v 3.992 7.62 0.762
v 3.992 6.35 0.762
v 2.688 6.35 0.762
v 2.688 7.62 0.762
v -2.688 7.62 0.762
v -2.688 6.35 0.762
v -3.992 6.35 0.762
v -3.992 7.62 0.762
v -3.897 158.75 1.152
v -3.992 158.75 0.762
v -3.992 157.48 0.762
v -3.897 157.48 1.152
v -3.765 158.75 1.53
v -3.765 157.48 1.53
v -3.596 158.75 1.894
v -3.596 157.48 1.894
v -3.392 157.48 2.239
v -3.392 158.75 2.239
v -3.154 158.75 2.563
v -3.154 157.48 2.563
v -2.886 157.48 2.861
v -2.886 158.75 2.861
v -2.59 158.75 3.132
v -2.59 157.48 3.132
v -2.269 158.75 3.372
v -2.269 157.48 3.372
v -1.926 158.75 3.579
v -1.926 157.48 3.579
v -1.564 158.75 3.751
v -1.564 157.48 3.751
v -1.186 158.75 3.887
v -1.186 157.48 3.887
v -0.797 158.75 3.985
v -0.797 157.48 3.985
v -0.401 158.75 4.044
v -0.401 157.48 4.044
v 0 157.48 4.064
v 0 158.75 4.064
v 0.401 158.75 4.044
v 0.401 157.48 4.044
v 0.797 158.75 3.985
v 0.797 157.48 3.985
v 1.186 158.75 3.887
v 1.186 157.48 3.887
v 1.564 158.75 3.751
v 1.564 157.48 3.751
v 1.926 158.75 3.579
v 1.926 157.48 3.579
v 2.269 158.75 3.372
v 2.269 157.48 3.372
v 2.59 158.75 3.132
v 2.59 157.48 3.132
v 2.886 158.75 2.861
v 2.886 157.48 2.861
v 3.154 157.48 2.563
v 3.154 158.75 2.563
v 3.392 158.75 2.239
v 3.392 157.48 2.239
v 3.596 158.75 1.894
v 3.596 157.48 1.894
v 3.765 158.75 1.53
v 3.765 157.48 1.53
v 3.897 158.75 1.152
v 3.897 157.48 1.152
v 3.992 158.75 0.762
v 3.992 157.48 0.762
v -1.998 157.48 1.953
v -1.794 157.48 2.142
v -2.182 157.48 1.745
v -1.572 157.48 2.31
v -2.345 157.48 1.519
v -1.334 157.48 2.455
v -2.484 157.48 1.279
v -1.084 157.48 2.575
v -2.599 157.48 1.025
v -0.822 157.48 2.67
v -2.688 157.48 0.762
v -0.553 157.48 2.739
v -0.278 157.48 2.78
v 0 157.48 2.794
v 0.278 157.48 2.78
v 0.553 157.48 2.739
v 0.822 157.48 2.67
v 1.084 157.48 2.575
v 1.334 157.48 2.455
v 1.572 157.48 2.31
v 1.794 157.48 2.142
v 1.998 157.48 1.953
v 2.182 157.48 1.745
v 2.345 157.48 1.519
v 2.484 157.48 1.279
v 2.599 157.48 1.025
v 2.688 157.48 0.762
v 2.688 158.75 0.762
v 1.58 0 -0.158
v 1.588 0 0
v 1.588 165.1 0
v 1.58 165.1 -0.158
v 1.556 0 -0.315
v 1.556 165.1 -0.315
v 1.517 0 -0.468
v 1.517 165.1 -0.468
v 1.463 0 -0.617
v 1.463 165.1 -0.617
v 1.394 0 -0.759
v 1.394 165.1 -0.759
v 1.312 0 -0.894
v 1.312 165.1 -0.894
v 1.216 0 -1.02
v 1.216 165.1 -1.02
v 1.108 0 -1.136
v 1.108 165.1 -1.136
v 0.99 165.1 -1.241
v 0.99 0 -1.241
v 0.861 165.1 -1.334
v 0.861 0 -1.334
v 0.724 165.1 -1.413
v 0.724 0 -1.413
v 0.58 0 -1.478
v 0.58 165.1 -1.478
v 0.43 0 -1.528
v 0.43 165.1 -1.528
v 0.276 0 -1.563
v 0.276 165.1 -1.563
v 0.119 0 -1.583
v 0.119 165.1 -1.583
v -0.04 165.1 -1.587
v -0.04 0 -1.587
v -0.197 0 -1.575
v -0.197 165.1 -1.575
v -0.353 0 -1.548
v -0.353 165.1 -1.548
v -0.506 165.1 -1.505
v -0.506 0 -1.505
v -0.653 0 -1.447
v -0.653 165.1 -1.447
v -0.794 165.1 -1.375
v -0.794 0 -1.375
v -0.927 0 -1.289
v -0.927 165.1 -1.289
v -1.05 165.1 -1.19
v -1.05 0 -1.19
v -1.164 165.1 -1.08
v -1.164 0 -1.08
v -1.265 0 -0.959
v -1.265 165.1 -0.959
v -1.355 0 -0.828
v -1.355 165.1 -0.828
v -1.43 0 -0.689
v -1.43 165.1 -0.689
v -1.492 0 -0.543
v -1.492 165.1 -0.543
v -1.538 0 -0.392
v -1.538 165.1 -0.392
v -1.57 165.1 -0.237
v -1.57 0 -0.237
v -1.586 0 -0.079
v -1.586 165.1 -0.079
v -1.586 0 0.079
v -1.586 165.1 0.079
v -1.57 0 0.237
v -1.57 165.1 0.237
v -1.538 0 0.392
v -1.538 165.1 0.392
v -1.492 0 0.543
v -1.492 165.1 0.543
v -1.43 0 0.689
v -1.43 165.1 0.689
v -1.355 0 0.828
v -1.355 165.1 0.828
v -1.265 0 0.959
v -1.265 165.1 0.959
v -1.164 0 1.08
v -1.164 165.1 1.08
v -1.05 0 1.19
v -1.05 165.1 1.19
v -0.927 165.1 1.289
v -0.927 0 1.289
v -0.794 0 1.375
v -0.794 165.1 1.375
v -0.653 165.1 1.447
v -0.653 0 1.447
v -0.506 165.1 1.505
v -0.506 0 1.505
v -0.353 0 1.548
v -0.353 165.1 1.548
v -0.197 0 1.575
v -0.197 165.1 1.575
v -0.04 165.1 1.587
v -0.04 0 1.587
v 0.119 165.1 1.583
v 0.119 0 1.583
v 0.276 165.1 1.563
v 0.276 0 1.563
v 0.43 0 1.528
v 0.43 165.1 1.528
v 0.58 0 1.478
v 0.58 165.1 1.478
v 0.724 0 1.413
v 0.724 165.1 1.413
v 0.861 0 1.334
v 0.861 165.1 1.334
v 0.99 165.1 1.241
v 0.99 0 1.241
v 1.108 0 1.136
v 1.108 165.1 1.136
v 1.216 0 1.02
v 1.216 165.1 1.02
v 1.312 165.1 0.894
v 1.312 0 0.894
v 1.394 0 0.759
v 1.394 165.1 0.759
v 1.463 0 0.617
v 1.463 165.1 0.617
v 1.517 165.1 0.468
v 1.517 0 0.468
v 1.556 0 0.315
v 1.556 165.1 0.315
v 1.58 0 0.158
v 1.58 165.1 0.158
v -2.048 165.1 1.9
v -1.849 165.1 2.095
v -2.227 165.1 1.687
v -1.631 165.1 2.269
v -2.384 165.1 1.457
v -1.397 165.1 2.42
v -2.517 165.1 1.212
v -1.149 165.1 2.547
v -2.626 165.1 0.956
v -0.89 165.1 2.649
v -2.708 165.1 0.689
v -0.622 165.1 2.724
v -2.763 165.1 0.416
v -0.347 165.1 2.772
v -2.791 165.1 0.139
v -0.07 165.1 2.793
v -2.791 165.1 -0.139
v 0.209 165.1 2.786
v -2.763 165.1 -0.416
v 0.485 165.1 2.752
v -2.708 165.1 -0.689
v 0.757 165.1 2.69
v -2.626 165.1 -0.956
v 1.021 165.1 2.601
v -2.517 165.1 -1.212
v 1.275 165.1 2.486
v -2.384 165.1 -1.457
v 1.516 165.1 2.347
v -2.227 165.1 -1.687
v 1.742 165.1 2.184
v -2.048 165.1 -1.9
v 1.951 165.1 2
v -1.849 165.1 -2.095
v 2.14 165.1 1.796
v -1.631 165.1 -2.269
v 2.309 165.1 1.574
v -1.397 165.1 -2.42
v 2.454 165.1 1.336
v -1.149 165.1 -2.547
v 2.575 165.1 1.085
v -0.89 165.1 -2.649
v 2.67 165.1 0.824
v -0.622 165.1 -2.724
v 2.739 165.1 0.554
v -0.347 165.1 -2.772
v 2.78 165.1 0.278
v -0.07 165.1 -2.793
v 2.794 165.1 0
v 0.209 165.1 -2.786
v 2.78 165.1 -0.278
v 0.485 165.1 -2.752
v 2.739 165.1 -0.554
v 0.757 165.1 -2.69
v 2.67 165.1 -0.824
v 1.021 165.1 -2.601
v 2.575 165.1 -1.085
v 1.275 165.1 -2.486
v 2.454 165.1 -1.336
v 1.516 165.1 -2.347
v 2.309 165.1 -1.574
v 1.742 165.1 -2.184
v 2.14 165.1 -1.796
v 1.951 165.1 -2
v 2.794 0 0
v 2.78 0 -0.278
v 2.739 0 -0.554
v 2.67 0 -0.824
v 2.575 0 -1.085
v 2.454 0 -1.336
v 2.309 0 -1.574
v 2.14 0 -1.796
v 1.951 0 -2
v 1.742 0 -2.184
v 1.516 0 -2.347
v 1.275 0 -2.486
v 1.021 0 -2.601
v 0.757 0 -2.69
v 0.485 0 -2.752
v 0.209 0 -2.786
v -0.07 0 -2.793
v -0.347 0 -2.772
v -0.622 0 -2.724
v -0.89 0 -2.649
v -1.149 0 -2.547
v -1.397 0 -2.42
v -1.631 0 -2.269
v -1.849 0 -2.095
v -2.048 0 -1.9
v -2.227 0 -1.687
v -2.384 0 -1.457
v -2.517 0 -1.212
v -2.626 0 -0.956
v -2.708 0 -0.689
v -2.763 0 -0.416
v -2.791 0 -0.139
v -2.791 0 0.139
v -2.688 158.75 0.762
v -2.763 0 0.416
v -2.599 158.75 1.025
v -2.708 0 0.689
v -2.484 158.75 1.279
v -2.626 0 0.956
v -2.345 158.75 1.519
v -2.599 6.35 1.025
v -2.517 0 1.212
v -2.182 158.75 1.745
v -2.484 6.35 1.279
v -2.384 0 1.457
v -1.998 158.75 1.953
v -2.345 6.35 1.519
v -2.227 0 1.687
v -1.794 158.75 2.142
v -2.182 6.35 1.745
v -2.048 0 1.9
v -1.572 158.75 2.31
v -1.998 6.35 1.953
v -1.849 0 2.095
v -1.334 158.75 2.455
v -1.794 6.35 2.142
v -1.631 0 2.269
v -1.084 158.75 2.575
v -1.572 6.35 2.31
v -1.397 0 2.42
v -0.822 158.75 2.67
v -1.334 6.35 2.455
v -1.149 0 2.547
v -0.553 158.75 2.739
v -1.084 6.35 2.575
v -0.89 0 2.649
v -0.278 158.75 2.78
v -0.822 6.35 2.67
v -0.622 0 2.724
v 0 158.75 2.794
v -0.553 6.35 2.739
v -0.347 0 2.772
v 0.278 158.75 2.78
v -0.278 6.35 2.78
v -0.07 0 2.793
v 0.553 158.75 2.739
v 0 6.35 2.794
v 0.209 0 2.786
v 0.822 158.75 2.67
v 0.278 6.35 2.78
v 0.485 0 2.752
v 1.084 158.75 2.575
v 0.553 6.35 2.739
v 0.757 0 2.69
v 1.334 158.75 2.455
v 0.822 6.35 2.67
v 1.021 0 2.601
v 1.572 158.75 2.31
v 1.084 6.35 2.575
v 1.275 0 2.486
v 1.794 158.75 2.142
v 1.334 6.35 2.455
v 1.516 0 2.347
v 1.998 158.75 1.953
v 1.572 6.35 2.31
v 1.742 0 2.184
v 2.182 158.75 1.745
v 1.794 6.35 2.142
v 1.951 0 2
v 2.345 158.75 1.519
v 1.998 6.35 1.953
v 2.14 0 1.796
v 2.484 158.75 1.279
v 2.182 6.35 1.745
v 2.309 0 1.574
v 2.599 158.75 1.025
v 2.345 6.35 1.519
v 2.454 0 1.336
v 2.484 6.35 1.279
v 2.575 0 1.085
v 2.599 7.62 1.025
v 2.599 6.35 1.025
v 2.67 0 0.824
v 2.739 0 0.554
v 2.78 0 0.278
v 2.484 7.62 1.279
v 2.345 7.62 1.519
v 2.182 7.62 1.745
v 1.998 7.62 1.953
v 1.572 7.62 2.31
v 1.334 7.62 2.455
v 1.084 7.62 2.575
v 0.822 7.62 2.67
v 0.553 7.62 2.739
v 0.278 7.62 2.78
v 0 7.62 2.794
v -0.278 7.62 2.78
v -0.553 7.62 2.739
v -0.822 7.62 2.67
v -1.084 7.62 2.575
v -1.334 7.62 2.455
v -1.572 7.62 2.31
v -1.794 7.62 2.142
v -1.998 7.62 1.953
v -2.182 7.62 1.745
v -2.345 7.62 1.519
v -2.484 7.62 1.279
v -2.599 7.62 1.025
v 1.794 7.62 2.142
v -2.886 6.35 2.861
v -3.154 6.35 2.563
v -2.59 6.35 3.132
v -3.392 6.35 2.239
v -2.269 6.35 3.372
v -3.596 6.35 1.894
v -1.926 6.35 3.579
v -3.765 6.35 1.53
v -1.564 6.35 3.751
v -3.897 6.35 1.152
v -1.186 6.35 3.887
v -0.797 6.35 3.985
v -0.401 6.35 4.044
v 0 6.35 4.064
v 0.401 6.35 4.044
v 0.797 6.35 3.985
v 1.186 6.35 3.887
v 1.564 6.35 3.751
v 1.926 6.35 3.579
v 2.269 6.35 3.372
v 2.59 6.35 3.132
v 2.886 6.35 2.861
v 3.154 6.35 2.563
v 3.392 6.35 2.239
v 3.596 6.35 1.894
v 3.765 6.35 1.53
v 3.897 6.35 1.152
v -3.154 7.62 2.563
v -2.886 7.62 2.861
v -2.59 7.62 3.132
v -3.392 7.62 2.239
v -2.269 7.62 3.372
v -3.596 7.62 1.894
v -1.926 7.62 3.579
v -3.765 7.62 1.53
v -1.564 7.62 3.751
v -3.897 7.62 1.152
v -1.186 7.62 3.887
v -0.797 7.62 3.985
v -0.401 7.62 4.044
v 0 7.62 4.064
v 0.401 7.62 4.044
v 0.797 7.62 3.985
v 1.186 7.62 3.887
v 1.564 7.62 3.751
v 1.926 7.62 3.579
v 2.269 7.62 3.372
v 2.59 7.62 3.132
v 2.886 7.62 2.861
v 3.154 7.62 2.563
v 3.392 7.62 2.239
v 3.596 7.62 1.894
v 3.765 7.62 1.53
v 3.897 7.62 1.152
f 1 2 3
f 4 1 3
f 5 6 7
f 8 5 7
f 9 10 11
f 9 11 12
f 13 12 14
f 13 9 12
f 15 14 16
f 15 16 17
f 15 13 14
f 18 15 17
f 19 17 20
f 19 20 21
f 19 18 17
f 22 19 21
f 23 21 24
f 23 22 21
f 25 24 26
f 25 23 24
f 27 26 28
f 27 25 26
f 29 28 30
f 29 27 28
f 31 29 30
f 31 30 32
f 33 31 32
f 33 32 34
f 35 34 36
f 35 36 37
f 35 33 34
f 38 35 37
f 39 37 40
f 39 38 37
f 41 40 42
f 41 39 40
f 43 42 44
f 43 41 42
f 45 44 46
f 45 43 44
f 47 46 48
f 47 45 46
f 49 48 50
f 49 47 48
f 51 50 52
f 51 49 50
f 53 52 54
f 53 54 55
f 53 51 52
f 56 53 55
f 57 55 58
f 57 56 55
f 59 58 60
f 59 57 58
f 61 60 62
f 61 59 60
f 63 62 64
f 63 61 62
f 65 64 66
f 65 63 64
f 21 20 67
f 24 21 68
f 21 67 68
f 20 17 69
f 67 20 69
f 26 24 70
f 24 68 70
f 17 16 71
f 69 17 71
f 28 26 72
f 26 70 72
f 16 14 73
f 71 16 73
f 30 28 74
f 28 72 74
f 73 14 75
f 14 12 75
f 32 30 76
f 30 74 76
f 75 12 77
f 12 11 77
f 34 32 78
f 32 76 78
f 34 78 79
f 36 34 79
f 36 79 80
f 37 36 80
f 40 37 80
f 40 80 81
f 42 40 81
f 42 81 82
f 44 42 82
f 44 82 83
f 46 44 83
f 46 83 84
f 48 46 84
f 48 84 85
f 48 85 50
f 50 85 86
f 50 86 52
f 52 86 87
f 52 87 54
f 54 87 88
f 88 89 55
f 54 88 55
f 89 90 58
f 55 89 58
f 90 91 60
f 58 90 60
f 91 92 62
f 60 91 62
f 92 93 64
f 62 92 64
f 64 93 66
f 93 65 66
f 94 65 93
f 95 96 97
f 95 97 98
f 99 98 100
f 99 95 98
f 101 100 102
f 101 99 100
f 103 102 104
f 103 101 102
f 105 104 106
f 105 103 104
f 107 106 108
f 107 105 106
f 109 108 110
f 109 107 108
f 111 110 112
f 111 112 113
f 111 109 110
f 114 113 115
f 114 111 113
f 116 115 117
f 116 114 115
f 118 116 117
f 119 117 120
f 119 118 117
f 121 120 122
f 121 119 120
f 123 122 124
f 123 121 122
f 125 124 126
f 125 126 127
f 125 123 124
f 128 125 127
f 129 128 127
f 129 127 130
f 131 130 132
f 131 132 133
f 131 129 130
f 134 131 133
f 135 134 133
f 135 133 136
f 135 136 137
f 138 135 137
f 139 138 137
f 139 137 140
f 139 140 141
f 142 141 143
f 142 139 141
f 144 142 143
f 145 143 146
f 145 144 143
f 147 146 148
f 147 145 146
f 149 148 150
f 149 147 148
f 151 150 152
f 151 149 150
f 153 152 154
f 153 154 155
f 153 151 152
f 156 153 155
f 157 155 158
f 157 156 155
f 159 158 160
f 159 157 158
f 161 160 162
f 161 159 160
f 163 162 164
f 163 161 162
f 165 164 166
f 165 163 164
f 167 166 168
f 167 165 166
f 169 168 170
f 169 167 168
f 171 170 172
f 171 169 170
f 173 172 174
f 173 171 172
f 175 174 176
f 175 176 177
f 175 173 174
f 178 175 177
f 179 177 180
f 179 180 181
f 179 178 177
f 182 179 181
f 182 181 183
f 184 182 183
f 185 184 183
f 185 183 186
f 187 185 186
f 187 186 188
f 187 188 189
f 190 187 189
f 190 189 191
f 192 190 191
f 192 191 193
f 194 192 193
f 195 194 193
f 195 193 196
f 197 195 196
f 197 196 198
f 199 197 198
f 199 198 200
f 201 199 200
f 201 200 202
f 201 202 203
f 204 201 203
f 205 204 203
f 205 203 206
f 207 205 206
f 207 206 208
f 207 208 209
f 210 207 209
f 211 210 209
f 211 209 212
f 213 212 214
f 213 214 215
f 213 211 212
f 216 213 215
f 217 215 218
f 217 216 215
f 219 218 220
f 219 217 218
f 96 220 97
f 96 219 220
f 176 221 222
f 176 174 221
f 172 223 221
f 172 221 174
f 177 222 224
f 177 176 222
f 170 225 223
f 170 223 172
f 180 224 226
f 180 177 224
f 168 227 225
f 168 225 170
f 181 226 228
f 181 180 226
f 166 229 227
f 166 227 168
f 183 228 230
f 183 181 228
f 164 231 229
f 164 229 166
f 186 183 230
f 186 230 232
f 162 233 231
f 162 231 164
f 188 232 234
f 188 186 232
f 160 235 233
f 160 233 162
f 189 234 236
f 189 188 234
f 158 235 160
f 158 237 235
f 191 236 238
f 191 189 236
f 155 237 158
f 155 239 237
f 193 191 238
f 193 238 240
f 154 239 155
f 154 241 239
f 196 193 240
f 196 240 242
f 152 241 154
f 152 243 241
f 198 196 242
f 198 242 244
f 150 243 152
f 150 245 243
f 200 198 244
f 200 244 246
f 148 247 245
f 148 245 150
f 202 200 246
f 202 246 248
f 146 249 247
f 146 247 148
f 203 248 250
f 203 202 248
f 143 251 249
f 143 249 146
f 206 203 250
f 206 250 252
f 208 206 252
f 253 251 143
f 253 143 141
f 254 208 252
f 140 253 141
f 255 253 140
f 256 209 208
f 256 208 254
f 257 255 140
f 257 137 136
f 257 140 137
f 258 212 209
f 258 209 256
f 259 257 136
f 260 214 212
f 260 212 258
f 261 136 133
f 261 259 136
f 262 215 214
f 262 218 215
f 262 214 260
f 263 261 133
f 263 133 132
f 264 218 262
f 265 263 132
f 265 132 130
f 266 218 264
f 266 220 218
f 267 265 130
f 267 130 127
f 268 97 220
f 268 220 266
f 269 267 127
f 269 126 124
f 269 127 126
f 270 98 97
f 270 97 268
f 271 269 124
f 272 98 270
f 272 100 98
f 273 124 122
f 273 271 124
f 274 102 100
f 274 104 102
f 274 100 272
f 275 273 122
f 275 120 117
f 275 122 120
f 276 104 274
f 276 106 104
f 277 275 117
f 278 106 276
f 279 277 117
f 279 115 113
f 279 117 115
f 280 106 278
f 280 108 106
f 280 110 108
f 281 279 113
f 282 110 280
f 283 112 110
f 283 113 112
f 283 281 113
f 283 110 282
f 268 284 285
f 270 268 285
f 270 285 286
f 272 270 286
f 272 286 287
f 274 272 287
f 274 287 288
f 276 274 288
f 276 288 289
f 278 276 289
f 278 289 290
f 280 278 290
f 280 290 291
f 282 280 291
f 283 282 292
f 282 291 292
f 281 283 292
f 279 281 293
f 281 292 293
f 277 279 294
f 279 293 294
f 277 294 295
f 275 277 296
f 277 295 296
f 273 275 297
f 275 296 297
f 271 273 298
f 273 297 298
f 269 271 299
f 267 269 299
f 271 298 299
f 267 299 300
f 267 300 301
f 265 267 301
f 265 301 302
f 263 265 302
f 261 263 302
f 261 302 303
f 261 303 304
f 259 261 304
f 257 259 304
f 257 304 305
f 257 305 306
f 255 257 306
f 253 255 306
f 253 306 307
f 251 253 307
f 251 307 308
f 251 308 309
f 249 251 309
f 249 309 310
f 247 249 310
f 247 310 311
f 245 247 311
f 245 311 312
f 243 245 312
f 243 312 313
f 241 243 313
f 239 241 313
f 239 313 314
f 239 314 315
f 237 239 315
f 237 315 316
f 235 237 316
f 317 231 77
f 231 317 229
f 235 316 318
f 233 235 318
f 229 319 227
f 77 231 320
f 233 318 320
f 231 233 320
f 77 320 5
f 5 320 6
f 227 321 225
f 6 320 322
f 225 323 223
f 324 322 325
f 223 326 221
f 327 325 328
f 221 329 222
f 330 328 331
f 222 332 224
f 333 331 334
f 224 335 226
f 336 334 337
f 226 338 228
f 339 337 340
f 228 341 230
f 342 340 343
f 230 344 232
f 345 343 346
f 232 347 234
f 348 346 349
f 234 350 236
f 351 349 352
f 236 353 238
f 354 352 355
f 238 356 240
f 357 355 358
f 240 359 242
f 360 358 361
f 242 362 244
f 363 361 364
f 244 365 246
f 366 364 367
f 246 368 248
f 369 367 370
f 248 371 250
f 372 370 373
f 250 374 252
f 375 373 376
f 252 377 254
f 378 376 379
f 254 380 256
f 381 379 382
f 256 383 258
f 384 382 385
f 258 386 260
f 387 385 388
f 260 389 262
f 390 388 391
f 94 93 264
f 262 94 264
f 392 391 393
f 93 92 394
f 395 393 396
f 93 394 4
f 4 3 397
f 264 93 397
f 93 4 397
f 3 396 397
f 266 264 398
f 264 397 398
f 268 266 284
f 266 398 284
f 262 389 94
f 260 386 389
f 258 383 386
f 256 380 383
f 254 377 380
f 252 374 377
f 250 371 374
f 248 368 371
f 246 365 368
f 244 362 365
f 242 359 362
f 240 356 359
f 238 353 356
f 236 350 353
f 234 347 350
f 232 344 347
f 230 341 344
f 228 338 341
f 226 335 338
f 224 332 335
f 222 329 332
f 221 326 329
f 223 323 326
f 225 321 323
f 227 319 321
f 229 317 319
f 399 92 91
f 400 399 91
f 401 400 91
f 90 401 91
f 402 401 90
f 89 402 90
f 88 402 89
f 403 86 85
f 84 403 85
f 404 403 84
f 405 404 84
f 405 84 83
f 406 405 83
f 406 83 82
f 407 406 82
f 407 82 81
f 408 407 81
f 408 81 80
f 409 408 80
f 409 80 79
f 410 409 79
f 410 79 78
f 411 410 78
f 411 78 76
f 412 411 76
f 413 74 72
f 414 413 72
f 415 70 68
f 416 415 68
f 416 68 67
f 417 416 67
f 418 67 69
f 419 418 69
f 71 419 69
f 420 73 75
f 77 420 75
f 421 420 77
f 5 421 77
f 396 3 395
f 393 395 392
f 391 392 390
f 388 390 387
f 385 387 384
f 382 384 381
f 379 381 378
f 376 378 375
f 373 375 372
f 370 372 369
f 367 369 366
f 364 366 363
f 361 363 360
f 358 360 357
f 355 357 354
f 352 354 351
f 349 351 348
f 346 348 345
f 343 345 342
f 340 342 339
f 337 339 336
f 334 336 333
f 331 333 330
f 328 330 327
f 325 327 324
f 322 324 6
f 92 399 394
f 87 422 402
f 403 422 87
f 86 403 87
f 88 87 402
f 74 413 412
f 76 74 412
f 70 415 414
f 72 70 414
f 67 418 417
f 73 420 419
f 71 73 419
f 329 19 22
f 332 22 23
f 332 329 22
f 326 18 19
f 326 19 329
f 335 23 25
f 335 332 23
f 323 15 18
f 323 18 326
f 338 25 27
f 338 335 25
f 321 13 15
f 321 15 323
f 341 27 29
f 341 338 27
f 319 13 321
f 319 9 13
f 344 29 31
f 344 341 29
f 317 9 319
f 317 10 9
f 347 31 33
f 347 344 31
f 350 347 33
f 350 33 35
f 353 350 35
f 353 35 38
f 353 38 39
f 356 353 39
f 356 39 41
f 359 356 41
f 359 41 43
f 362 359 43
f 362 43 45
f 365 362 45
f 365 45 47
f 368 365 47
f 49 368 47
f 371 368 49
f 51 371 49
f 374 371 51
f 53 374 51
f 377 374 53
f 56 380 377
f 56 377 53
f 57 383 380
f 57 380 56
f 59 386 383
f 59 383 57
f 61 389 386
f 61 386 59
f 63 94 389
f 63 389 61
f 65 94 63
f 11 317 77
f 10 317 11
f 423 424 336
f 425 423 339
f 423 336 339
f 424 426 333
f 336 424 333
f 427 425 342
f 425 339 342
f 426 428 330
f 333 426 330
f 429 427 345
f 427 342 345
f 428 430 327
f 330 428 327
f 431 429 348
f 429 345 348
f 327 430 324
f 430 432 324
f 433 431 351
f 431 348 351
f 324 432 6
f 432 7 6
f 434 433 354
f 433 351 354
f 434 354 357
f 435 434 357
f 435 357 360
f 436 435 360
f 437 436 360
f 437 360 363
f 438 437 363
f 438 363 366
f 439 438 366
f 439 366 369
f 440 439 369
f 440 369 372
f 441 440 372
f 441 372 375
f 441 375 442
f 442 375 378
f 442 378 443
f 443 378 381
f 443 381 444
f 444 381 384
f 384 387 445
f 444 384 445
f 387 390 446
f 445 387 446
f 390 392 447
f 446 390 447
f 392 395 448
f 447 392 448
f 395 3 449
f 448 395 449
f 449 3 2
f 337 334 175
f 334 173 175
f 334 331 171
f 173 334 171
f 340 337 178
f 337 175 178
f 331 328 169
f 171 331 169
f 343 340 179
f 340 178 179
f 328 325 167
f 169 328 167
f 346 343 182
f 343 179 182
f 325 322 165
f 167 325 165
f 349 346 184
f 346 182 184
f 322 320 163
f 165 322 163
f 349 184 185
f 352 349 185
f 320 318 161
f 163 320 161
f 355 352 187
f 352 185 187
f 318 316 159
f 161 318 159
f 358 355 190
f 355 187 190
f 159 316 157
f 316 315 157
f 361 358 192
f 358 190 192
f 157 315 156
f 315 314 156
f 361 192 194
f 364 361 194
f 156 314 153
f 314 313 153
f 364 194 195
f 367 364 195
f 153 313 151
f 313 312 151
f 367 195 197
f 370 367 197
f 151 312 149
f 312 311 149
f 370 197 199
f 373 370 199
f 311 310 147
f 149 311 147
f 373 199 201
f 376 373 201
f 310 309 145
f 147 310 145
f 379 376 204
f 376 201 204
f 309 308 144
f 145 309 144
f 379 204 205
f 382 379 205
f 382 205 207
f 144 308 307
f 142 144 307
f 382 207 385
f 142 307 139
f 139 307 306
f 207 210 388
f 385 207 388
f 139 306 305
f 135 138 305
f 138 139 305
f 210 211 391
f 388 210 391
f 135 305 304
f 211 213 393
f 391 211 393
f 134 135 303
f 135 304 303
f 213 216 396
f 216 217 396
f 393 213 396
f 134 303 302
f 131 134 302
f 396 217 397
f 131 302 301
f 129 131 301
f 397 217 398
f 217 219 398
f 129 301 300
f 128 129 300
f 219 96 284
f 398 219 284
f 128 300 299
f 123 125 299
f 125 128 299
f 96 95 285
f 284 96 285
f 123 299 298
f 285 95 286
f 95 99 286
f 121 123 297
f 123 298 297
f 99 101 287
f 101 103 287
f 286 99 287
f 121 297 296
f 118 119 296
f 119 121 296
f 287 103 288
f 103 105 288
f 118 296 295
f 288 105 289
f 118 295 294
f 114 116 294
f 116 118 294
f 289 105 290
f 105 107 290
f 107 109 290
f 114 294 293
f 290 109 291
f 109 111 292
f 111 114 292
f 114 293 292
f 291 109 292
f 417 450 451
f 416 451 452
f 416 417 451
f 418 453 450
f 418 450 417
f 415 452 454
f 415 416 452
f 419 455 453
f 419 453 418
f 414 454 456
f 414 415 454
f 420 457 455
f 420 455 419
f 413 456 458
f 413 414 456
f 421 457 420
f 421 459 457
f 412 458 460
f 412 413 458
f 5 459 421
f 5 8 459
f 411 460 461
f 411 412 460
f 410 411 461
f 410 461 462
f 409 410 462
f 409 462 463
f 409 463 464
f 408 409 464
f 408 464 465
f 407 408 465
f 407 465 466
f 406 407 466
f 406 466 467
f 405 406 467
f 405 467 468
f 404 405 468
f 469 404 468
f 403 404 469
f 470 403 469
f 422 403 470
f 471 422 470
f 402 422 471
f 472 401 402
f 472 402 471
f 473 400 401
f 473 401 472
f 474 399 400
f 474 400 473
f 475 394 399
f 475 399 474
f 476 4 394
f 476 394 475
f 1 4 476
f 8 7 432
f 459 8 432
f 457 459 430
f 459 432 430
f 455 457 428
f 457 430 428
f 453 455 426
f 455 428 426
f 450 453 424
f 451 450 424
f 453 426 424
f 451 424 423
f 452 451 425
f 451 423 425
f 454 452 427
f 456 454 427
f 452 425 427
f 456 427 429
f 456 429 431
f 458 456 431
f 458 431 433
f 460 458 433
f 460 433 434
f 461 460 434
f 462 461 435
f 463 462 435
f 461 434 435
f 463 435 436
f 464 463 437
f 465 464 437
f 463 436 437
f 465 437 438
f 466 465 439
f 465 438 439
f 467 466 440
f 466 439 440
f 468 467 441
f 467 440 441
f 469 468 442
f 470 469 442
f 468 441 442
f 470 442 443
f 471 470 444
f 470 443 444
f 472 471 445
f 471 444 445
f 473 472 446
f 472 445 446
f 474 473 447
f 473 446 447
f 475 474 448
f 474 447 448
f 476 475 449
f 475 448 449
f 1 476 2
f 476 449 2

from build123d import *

# Parameters (mm, degrees)
SKETCH1_R           = 2.794
SKETCH1_R_2         = 1.5875
BOSS_EXTRUDE1_DEPTH = 165.1
BOSS_EXTRUDE2_DEPTH = 1.27


with BuildPart() as part:
    # Sketch1 → Boss-Extrude1 (new body)
    with BuildSketch(Plane(origin=(0, 0, 0), x_dir=(1, 0, 0), z_dir=(0, 1, 0))):
        Circle(SKETCH1_R)
        Circle(SKETCH1_R_2, mode=Mode.SUBTRACT)
    extrude(amount=BOSS_EXTRUDE1_DEPTH)

    # Sketch2 → Boss-Extrude2 (add)
    with BuildSketch(Plane(origin=(0, 6.35, 0), x_dir=(-1, 0, 0), z_dir=(0, -1, 0))):
        with BuildLine():
            Line((-3.991923346, -0.762), (-2.688083332, -0.762))
            ThreePointArc((-2.688083332, -0.762), (0, -2.794), (2.688083332, -0.762))
            Line((2.688083332, -0.762), (3.991923346, -0.762))
            ThreePointArc((3.991923346, -0.762), (0, -4.064), (-3.991923346, -0.762))
        make_face()
    boss_extrude2 = extrude(amount=-BOSS_EXTRUDE2_DEPTH)

    # Mirror1: Boss-Extrude2 across plane
    add(boss_extrude2.mirror(Plane(origin=(0, 82.55, 0), x_dir=(0, 0, 1), z_dir=(0, -1, 0))))


solid = part.part
